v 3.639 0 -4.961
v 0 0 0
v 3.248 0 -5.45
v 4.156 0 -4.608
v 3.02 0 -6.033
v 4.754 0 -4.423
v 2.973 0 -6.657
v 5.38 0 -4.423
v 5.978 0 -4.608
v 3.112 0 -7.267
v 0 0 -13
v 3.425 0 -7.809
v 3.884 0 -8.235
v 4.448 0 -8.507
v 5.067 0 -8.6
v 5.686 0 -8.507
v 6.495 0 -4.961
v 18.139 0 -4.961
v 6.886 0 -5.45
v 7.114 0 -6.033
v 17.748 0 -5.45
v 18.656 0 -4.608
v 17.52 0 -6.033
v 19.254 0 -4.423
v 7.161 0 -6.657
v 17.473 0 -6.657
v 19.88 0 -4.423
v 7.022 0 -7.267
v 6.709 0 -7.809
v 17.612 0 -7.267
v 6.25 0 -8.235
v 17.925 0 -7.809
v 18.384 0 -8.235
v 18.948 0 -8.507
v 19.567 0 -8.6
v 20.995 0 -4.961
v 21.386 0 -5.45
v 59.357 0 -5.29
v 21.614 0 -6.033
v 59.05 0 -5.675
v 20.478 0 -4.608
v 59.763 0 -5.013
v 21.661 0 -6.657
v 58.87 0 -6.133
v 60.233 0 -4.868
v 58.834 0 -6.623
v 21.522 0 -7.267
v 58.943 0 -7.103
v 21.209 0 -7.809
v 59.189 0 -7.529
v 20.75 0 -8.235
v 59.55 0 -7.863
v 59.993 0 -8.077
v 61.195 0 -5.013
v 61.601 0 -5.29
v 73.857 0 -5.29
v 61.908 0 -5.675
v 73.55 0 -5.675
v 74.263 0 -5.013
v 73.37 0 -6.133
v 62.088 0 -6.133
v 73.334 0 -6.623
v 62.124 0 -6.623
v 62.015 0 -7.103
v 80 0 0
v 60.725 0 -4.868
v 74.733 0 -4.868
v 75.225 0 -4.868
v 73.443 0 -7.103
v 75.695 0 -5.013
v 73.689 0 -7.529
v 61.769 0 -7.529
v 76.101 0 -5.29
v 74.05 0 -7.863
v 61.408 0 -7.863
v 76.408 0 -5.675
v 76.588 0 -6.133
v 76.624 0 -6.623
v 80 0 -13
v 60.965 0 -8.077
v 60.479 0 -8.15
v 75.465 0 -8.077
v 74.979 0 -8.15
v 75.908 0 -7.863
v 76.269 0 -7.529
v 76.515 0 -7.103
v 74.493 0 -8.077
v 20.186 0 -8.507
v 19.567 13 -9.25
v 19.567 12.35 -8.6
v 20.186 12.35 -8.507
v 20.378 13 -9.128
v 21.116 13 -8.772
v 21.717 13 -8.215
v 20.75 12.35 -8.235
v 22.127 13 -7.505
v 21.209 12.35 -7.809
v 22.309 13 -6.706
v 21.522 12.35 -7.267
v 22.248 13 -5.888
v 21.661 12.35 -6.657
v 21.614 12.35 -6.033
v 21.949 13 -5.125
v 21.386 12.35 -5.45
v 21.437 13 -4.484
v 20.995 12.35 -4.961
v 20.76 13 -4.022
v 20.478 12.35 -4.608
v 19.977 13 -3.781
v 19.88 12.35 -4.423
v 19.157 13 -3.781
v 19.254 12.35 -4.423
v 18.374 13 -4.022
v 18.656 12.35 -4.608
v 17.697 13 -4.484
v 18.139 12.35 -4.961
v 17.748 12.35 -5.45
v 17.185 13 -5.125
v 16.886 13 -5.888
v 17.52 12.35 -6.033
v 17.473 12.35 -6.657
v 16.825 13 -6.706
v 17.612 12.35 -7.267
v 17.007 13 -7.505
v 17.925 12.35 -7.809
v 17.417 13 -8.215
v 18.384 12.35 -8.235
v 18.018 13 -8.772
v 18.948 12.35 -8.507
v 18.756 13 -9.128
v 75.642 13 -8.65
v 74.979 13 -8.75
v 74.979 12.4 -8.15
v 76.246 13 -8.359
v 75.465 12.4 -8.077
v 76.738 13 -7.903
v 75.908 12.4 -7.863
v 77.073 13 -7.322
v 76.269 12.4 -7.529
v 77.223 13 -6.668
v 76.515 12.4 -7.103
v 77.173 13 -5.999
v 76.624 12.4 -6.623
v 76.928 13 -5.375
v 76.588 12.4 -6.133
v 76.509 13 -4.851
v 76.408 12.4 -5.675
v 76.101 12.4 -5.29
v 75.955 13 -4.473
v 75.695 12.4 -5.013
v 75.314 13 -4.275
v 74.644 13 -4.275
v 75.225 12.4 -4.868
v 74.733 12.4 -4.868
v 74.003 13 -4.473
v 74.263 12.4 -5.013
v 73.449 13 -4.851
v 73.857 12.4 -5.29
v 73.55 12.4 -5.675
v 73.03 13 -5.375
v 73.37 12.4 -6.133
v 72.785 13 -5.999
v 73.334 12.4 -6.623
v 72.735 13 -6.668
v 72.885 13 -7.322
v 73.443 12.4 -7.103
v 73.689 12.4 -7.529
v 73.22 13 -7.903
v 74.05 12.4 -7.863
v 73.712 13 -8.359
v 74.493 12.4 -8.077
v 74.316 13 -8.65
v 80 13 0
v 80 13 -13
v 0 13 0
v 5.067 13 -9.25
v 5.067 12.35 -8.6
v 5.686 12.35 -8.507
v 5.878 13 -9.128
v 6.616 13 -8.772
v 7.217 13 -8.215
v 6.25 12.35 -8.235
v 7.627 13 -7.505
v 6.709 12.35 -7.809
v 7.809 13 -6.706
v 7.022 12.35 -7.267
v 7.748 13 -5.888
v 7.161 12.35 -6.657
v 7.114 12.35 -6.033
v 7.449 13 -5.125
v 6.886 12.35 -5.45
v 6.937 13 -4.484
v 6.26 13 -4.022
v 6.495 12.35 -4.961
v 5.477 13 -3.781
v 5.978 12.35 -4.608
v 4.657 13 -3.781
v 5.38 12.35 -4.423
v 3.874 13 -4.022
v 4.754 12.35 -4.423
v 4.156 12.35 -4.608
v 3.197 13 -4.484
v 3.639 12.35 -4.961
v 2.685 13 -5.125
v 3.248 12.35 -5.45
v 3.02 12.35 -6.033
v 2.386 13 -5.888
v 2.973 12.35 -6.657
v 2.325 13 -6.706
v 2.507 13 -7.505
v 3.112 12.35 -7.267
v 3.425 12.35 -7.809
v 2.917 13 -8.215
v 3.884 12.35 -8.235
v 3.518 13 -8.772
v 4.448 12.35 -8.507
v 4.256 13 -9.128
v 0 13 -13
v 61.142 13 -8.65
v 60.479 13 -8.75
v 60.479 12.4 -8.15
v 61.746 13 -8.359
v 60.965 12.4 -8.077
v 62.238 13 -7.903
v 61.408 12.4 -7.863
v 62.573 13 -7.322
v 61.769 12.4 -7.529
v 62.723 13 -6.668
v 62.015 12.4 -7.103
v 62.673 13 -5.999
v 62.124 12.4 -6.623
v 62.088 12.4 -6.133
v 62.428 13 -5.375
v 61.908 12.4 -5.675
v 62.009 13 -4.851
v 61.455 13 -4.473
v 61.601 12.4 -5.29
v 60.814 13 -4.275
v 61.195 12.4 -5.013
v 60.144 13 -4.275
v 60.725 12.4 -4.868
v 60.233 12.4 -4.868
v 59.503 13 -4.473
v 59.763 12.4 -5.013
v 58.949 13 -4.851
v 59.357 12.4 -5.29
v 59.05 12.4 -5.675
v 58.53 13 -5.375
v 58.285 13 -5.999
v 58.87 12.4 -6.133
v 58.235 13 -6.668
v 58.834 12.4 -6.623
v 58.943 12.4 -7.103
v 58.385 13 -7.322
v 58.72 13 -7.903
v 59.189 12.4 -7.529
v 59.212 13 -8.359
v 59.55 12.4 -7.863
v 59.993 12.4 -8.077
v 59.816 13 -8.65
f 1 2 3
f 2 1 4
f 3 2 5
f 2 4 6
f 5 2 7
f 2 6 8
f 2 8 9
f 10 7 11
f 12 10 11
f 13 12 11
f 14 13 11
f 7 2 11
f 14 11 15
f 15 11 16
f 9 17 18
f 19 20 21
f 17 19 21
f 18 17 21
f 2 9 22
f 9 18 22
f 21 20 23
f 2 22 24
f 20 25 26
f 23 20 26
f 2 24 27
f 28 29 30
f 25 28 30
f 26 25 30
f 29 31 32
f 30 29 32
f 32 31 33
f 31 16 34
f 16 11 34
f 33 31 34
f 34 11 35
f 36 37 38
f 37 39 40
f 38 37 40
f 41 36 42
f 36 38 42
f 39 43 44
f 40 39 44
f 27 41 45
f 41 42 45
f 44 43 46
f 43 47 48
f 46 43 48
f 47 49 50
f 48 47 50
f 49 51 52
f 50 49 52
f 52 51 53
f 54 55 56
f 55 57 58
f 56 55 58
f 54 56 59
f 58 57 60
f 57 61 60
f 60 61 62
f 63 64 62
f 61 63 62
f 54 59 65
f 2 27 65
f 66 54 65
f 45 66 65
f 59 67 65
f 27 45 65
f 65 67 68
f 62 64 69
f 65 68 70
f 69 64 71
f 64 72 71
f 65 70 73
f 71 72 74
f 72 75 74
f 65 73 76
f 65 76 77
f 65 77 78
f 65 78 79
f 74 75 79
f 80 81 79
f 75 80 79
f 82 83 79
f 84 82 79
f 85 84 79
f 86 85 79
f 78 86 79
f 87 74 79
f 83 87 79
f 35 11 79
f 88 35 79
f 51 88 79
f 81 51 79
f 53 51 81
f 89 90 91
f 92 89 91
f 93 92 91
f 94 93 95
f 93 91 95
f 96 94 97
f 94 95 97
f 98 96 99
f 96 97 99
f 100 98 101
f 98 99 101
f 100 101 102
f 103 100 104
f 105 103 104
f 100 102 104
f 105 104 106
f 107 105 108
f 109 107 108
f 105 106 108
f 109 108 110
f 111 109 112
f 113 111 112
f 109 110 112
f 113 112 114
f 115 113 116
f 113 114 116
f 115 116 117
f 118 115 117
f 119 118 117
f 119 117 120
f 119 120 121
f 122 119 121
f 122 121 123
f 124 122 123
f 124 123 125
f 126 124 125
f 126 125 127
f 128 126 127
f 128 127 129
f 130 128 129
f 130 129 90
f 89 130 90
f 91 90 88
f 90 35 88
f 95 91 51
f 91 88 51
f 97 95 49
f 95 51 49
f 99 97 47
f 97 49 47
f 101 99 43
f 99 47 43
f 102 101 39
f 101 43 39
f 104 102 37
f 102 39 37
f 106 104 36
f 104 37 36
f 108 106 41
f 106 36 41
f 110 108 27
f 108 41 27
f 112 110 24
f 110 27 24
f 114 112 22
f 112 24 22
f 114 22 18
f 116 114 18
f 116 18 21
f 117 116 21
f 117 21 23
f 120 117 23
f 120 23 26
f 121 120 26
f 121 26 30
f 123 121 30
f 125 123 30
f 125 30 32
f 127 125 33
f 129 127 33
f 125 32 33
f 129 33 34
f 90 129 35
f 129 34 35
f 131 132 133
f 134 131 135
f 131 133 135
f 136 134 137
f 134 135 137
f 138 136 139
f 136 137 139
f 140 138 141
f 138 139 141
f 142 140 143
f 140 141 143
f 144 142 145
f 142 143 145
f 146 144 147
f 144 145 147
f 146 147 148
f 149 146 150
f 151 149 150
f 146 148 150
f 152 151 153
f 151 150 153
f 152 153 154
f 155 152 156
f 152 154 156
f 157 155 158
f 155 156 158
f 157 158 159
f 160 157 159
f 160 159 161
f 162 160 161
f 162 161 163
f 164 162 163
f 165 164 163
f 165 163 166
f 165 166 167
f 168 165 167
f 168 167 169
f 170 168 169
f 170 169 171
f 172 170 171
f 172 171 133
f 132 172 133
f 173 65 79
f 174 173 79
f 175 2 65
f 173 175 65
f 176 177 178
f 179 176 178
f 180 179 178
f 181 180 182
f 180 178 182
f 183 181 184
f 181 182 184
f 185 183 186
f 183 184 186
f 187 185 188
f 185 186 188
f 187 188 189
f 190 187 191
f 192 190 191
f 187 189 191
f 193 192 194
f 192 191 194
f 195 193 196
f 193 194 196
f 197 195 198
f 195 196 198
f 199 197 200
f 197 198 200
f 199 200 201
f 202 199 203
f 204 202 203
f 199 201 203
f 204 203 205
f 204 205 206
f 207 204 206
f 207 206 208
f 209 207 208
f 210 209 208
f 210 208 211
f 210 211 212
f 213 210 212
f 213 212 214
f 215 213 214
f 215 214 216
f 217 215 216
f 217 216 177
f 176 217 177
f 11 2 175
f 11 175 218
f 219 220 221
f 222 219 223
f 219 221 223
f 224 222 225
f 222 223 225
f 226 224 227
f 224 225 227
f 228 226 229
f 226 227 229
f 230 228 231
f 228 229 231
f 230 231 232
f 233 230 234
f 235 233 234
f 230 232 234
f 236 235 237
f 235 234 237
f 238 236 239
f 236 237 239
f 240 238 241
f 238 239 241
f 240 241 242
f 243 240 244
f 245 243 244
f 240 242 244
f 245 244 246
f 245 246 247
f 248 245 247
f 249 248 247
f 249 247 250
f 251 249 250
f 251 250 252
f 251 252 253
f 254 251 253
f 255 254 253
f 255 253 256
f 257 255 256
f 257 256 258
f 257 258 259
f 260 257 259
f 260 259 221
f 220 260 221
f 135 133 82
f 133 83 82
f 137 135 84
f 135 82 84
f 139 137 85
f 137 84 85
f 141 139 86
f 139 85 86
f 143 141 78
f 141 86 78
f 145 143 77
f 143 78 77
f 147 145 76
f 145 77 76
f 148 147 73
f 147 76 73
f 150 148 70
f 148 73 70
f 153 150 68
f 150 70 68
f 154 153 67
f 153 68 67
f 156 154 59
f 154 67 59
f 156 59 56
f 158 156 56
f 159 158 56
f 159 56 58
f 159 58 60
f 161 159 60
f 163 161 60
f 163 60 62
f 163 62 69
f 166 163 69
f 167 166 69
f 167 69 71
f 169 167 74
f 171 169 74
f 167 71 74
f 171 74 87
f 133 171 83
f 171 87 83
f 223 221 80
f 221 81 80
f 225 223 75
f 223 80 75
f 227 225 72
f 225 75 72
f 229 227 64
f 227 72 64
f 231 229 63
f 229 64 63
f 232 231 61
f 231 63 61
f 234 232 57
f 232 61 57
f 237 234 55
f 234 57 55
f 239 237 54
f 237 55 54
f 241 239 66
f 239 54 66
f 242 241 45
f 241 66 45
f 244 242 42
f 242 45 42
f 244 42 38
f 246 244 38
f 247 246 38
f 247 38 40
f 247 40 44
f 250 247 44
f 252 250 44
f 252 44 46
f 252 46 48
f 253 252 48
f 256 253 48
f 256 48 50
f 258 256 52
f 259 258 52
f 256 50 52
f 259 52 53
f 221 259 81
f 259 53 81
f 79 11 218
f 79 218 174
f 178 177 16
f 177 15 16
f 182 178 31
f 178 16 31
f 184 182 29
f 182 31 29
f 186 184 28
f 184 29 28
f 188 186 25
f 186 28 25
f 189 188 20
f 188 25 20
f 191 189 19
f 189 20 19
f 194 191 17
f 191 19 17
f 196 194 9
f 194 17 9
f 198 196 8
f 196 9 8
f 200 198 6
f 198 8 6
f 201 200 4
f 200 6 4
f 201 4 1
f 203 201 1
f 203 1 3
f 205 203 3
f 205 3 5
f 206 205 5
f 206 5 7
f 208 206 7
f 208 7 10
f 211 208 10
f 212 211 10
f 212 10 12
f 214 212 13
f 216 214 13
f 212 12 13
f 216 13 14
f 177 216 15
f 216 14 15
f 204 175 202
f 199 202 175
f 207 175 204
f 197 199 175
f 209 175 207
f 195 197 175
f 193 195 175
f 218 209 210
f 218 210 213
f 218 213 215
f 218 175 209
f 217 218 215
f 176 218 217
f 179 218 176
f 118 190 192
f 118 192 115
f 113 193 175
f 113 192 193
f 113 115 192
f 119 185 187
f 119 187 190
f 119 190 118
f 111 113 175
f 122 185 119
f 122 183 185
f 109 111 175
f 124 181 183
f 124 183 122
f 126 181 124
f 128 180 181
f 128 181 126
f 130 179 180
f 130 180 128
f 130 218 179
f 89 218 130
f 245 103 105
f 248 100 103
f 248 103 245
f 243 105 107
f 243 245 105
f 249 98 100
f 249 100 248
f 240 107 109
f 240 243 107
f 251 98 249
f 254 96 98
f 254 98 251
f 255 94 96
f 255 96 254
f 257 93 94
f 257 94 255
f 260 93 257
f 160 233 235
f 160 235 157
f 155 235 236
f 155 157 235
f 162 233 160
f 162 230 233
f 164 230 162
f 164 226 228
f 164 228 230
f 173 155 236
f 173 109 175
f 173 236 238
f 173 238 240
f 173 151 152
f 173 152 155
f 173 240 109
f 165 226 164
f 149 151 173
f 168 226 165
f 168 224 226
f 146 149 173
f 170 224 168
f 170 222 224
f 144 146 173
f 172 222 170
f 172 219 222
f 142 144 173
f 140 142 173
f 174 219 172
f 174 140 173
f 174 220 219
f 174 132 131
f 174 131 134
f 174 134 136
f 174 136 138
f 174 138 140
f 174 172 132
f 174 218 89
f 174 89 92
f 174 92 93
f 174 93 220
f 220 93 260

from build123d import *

# Parameters (mm, degrees)
SKETCH1_W                       = 80
SKETCH1_H                       = 13
BOSS_EXTRUDE1_DEPTH             = 13
M4X0_7_TAPPED_HOLE1_D           = 3.3
M4X0_7_TAPPED_HOLE1_CSINK_D     = 4.5
M4X0_7_TAPPED_HOLE1_CSINK_ANGLE = 90
M5X0_8_TAPPED_HOLE1_D           = 4.2
M5X0_8_TAPPED_HOLE1_CSINK_D     = 5.5
M5X0_8_TAPPED_HOLE1_CSINK_ANGLE = 90


with BuildPart() as part:
    # Sketch1 → Boss-Extrude1 (new body)
    with BuildSketch(Plane(origin=(0, 0, 0), x_dir=(1, 0, 0), z_dir=(0, 1, 0))):
        with Locations((40, 6.5)):
            Rectangle(SKETCH1_W, SKETCH1_H)
    extrude(amount=BOSS_EXTRUDE1_DEPTH)

    # M4x0.7 Tapped Hole1 (through all)
    with Locations(Plane(origin=(74.979, 13, -6.5), x_dir=(0, 0, 1), z_dir=(0, 1, 0))):
        with Locations((0, 0), (0, -14.5)):
            CounterSinkHole(M4X0_7_TAPPED_HOLE1_D / 2, M4X0_7_TAPPED_HOLE1_CSINK_D / 2, counter_sink_angle=M4X0_7_TAPPED_HOLE1_CSINK_ANGLE)

    # M5x0.8 Tapped Hole1 (through all)
    with Locations(Plane(origin=(5.067, 13, -6.5), x_dir=(0, 0, 1), z_dir=(0, 1, 0))):
        with Locations((0, 0), (0, 14.5)):
            CounterSinkHole(M5X0_8_TAPPED_HOLE1_D / 2, M5X0_8_TAPPED_HOLE1_CSINK_D / 2, counter_sink_angle=M5X0_8_TAPPED_HOLE1_CSINK_ANGLE)


solid = part.part
